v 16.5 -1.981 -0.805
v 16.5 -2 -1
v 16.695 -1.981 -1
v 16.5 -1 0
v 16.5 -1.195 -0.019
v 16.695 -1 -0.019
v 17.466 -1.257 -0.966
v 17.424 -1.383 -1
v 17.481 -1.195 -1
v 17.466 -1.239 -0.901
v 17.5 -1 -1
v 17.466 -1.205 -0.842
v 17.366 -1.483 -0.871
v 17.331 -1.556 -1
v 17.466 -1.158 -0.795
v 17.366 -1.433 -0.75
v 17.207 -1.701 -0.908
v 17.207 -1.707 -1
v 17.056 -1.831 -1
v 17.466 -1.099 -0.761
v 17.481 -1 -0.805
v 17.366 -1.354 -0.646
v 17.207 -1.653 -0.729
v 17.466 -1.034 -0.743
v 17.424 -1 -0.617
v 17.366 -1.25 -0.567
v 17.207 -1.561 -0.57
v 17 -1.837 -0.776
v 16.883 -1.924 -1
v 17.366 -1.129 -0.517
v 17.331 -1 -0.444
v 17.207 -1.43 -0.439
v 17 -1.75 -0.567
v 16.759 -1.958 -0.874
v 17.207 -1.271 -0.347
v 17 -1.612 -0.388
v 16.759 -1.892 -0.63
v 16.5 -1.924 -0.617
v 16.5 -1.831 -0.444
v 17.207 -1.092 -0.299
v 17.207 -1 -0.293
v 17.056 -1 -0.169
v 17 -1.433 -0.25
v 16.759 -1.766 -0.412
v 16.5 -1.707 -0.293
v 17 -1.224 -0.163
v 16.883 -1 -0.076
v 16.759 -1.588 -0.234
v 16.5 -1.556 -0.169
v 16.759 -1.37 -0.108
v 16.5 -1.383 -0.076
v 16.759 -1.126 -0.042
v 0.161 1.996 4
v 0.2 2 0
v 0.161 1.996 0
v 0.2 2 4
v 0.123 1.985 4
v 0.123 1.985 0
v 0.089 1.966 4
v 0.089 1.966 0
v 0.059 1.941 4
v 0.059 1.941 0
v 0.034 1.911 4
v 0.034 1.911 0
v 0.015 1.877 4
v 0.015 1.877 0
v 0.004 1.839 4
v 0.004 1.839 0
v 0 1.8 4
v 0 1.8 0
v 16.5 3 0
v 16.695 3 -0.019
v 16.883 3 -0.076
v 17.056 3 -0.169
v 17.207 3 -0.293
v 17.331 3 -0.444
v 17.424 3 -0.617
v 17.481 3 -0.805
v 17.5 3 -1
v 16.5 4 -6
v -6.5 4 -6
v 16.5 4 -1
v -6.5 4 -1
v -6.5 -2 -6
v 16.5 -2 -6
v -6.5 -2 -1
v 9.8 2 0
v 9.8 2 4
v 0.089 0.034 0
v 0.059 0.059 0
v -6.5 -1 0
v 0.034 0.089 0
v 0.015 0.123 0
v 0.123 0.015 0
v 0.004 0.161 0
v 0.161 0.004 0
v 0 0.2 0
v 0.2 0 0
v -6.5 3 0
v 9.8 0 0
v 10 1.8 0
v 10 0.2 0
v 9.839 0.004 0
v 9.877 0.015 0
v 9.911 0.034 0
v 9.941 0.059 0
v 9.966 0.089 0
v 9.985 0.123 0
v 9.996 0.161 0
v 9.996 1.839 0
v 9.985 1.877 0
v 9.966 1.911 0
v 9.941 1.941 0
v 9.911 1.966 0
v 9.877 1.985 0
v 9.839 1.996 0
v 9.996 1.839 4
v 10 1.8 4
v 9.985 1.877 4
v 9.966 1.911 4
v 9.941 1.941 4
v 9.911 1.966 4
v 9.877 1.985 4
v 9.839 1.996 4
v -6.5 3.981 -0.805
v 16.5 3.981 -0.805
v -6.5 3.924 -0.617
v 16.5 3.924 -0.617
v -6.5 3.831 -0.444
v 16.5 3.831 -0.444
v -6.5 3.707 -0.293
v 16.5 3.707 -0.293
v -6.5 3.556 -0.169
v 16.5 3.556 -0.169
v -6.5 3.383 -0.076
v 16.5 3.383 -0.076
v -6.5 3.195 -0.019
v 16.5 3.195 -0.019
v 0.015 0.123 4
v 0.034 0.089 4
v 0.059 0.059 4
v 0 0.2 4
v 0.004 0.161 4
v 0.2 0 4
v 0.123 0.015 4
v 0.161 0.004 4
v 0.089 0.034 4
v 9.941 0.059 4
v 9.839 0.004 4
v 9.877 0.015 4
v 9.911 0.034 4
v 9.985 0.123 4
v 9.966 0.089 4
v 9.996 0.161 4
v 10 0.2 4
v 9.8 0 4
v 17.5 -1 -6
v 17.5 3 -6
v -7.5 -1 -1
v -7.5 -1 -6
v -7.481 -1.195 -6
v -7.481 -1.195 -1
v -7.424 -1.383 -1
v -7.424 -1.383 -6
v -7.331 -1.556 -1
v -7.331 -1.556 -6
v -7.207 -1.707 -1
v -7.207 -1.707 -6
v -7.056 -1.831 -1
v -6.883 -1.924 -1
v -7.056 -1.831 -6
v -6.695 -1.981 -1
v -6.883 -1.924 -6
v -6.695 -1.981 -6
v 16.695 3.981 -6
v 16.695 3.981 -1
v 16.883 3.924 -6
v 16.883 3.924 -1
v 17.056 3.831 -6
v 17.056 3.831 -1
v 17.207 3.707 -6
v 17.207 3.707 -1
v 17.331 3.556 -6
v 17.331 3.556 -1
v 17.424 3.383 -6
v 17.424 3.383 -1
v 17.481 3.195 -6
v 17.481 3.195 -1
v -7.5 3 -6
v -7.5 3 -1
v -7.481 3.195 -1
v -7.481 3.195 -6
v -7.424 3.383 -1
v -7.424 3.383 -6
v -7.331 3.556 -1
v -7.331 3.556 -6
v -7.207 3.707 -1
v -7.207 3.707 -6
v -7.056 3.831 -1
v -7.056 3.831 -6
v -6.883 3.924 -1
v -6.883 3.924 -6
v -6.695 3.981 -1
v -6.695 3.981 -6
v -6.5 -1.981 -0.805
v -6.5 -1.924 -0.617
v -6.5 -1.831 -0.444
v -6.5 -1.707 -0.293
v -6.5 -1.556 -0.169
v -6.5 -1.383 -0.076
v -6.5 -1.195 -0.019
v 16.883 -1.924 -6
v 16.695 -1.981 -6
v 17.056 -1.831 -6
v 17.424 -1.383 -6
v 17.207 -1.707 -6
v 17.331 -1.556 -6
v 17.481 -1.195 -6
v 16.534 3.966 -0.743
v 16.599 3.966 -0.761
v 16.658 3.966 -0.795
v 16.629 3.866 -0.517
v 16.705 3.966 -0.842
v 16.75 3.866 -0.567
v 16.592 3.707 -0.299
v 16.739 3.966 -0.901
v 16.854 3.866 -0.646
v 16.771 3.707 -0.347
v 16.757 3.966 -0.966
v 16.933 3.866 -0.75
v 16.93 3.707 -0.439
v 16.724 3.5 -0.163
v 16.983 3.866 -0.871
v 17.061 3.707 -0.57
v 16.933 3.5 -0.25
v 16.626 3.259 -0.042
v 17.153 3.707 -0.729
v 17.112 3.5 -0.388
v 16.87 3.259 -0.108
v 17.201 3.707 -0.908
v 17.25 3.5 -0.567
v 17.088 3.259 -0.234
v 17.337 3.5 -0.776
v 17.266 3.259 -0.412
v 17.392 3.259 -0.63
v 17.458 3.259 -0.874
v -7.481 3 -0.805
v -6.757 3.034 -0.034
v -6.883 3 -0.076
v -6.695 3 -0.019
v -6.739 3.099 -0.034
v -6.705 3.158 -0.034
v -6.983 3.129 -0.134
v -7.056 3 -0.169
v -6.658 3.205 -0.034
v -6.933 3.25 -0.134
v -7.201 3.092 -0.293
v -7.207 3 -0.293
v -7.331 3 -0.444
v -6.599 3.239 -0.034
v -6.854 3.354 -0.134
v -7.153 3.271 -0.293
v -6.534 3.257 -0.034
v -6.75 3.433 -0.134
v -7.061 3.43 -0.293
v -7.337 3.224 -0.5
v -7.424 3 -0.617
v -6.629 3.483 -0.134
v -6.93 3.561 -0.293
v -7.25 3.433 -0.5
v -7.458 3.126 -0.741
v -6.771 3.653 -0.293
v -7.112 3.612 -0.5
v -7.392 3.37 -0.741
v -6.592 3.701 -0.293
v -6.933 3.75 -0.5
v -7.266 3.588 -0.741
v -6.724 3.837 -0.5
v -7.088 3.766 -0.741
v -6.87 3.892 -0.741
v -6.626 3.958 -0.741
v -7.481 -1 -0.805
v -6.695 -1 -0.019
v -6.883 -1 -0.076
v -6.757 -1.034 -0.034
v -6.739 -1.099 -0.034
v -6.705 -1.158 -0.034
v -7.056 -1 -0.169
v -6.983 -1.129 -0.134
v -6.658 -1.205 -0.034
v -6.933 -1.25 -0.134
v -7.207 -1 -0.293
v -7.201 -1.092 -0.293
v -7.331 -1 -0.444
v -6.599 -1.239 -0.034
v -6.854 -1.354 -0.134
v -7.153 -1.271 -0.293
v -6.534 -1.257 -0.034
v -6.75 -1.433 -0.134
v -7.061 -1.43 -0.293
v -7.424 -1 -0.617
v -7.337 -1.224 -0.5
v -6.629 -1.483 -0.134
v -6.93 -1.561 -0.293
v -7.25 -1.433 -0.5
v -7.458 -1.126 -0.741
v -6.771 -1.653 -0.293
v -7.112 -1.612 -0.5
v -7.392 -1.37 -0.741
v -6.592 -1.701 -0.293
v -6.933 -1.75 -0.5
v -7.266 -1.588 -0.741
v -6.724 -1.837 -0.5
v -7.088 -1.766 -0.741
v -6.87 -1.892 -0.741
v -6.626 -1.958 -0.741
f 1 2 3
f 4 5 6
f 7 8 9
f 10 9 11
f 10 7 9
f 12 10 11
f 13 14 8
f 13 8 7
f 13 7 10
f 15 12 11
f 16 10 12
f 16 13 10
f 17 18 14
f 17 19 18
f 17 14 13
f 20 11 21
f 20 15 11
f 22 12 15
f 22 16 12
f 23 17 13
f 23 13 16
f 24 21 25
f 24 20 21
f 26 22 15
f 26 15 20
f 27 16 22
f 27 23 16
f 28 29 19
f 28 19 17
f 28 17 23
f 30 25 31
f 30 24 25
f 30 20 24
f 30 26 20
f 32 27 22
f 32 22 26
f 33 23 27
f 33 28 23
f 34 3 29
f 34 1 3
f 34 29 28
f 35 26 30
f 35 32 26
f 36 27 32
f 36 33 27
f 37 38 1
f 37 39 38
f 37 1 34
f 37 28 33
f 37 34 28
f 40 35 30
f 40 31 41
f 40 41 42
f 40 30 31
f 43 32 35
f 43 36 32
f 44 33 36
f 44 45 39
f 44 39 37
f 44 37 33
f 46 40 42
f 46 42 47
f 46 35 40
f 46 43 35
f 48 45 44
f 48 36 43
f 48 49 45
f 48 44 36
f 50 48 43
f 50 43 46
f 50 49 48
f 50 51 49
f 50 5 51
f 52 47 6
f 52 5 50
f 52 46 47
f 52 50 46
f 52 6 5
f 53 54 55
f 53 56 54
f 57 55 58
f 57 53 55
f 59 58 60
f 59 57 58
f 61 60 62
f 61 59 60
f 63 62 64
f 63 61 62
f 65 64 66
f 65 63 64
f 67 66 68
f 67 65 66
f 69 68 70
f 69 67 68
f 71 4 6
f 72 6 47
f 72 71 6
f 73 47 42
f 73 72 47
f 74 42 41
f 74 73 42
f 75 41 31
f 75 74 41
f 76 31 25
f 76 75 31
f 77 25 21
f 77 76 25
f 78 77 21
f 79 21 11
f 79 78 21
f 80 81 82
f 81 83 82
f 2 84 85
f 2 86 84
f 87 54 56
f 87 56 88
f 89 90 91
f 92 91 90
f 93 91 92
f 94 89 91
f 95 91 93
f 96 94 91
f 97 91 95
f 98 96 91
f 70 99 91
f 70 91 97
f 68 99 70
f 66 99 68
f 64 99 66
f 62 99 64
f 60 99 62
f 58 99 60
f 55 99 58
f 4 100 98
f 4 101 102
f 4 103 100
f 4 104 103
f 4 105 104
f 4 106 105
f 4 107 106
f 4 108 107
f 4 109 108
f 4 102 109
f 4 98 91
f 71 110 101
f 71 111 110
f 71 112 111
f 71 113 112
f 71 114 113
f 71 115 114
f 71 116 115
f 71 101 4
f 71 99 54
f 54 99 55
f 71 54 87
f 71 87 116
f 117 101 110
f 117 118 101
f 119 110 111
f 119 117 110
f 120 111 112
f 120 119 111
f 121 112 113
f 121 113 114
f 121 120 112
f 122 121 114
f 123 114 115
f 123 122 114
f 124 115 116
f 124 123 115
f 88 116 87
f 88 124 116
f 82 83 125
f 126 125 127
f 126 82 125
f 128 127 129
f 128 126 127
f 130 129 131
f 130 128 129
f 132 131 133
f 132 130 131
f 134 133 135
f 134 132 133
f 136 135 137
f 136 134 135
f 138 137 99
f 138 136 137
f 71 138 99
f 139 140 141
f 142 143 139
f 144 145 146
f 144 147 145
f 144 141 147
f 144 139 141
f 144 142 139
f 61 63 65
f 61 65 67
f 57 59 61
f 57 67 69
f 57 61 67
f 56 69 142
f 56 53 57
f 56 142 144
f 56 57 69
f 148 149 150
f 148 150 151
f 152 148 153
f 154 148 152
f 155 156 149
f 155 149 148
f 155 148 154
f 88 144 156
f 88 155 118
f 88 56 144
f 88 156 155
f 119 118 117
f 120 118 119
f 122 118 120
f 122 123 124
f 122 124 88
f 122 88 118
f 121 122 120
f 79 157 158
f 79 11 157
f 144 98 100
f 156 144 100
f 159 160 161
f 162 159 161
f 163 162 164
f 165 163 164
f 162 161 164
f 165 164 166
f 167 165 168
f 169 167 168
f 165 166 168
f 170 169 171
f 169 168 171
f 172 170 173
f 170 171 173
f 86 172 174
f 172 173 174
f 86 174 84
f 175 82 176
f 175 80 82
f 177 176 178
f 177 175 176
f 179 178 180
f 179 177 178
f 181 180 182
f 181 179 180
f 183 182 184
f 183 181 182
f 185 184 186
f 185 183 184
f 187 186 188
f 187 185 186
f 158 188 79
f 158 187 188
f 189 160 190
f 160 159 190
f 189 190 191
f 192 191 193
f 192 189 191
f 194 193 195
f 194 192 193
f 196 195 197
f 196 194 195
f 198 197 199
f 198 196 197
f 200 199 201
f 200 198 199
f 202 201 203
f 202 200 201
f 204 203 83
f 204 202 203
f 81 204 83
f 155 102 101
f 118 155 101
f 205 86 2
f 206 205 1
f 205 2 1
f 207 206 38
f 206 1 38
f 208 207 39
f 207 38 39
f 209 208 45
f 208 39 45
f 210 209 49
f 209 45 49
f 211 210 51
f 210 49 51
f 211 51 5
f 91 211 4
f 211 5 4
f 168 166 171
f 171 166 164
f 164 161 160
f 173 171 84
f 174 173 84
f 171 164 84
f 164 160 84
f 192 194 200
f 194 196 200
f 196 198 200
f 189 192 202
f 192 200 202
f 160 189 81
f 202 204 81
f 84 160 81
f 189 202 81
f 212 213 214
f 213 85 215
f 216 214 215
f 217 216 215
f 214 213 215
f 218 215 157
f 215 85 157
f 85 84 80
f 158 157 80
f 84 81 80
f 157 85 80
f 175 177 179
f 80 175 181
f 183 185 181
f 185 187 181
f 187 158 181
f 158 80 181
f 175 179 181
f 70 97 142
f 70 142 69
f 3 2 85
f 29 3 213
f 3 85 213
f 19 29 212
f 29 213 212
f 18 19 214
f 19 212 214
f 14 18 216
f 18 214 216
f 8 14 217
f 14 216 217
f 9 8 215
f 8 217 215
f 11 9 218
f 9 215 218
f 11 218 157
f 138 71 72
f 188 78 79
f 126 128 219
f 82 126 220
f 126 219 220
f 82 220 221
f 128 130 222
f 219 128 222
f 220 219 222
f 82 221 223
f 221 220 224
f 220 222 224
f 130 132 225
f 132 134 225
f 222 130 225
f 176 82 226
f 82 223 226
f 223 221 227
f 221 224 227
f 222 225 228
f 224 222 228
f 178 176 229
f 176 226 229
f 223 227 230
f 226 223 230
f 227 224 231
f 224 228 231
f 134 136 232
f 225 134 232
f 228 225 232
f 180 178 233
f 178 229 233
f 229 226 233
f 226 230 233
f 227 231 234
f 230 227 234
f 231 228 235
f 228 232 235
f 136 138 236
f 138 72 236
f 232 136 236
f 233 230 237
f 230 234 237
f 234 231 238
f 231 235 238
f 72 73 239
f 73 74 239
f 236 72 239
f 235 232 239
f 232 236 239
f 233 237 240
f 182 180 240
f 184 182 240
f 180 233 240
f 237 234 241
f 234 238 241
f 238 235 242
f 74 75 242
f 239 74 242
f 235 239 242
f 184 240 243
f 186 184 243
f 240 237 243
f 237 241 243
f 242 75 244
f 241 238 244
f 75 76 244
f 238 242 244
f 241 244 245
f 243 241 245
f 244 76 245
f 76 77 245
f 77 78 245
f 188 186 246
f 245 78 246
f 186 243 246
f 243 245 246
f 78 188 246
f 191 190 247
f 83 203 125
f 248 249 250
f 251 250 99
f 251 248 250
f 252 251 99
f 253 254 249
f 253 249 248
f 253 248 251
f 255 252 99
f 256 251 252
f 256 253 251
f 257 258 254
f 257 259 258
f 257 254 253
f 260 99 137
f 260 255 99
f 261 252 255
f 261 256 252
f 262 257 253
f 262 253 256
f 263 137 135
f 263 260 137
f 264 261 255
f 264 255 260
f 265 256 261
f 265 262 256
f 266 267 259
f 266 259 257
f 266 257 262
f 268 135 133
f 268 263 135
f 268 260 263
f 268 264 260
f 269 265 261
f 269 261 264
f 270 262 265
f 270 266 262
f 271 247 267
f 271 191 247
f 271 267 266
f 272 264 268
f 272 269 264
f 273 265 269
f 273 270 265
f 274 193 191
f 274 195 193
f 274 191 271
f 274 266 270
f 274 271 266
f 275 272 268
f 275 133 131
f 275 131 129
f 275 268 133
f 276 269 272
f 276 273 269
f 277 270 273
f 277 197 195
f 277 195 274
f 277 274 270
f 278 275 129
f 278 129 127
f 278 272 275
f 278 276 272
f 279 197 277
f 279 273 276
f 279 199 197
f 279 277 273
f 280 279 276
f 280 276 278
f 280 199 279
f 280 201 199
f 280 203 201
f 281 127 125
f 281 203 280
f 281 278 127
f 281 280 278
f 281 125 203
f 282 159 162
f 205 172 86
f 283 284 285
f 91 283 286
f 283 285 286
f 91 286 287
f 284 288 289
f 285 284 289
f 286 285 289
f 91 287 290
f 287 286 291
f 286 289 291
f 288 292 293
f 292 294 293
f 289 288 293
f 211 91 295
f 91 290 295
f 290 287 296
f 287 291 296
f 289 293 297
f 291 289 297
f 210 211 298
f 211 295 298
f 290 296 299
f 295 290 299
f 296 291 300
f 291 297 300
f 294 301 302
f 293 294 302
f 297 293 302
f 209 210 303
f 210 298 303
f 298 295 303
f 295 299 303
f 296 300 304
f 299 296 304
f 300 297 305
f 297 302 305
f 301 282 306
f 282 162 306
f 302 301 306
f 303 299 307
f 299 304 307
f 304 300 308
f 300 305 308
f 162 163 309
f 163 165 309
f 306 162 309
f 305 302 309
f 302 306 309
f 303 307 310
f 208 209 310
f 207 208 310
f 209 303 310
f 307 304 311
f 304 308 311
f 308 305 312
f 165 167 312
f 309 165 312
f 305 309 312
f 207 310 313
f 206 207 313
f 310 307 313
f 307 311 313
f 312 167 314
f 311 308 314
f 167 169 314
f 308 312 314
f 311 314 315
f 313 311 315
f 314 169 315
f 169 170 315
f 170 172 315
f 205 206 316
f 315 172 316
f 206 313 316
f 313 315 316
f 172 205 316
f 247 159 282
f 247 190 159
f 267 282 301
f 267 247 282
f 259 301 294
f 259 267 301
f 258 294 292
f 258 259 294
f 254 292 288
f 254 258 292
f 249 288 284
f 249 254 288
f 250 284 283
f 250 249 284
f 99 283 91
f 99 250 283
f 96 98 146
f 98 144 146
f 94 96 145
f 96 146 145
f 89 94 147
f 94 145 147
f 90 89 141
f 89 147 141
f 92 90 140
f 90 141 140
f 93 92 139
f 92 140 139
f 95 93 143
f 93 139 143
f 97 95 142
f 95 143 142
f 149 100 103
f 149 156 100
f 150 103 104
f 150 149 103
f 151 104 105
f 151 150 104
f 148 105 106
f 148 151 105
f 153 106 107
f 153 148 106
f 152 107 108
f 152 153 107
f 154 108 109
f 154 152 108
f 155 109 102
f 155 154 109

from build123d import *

# Parameters (mm, degrees)
SKETCH_W     = 10
SKETCH_H     = 2
PAD_DEPTH    = 4
SKETCH001_W  = 25
SKETCH001_H  = 6
PAD001_DEPTH = 6
FILLET_R     = 1
FILLET001_R  = 0.2


with BuildPart() as part:
    # Sketch → Pad (new body)
    with BuildSketch(Plane.XY):
        with Locations((5, 1)):
            Rectangle(SKETCH_W, SKETCH_H)
    extrude(amount=PAD_DEPTH)

    # Sketch001 → Pad001 (join)
    with BuildSketch(Plane.XY):
        with Locations((5, 1)):
            Rectangle(SKETCH001_W, SKETCH001_H)
    extrude(amount=-PAD001_DEPTH)

    # Fillet
    fillet_edges = [part.edges().sort_by_distance(p)[0] for p in [
        (-7.5, -2, -3),
        (-7.5, 4, -3),
        (-7.5, 1, 0),
        (5, -2, 0),
        (17.5, -2, -3),
        (17.5, 1, 0),
        (5, 4, 0),
        (17.5, 4, -3),
    ]]
    fillet(fillet_edges, radius=FILLET_R)

    # Fillet001
    fillet001_edges = [part.edges().sort_by_distance(p)[0] for p in [
        (10, 0, 2),
        (10, 2, 2),
        (0, 0, 2),
        (0, 2, 2),
    ]]
    fillet(fillet001_edges, radius=FILLET001_R)


solid = part.part
